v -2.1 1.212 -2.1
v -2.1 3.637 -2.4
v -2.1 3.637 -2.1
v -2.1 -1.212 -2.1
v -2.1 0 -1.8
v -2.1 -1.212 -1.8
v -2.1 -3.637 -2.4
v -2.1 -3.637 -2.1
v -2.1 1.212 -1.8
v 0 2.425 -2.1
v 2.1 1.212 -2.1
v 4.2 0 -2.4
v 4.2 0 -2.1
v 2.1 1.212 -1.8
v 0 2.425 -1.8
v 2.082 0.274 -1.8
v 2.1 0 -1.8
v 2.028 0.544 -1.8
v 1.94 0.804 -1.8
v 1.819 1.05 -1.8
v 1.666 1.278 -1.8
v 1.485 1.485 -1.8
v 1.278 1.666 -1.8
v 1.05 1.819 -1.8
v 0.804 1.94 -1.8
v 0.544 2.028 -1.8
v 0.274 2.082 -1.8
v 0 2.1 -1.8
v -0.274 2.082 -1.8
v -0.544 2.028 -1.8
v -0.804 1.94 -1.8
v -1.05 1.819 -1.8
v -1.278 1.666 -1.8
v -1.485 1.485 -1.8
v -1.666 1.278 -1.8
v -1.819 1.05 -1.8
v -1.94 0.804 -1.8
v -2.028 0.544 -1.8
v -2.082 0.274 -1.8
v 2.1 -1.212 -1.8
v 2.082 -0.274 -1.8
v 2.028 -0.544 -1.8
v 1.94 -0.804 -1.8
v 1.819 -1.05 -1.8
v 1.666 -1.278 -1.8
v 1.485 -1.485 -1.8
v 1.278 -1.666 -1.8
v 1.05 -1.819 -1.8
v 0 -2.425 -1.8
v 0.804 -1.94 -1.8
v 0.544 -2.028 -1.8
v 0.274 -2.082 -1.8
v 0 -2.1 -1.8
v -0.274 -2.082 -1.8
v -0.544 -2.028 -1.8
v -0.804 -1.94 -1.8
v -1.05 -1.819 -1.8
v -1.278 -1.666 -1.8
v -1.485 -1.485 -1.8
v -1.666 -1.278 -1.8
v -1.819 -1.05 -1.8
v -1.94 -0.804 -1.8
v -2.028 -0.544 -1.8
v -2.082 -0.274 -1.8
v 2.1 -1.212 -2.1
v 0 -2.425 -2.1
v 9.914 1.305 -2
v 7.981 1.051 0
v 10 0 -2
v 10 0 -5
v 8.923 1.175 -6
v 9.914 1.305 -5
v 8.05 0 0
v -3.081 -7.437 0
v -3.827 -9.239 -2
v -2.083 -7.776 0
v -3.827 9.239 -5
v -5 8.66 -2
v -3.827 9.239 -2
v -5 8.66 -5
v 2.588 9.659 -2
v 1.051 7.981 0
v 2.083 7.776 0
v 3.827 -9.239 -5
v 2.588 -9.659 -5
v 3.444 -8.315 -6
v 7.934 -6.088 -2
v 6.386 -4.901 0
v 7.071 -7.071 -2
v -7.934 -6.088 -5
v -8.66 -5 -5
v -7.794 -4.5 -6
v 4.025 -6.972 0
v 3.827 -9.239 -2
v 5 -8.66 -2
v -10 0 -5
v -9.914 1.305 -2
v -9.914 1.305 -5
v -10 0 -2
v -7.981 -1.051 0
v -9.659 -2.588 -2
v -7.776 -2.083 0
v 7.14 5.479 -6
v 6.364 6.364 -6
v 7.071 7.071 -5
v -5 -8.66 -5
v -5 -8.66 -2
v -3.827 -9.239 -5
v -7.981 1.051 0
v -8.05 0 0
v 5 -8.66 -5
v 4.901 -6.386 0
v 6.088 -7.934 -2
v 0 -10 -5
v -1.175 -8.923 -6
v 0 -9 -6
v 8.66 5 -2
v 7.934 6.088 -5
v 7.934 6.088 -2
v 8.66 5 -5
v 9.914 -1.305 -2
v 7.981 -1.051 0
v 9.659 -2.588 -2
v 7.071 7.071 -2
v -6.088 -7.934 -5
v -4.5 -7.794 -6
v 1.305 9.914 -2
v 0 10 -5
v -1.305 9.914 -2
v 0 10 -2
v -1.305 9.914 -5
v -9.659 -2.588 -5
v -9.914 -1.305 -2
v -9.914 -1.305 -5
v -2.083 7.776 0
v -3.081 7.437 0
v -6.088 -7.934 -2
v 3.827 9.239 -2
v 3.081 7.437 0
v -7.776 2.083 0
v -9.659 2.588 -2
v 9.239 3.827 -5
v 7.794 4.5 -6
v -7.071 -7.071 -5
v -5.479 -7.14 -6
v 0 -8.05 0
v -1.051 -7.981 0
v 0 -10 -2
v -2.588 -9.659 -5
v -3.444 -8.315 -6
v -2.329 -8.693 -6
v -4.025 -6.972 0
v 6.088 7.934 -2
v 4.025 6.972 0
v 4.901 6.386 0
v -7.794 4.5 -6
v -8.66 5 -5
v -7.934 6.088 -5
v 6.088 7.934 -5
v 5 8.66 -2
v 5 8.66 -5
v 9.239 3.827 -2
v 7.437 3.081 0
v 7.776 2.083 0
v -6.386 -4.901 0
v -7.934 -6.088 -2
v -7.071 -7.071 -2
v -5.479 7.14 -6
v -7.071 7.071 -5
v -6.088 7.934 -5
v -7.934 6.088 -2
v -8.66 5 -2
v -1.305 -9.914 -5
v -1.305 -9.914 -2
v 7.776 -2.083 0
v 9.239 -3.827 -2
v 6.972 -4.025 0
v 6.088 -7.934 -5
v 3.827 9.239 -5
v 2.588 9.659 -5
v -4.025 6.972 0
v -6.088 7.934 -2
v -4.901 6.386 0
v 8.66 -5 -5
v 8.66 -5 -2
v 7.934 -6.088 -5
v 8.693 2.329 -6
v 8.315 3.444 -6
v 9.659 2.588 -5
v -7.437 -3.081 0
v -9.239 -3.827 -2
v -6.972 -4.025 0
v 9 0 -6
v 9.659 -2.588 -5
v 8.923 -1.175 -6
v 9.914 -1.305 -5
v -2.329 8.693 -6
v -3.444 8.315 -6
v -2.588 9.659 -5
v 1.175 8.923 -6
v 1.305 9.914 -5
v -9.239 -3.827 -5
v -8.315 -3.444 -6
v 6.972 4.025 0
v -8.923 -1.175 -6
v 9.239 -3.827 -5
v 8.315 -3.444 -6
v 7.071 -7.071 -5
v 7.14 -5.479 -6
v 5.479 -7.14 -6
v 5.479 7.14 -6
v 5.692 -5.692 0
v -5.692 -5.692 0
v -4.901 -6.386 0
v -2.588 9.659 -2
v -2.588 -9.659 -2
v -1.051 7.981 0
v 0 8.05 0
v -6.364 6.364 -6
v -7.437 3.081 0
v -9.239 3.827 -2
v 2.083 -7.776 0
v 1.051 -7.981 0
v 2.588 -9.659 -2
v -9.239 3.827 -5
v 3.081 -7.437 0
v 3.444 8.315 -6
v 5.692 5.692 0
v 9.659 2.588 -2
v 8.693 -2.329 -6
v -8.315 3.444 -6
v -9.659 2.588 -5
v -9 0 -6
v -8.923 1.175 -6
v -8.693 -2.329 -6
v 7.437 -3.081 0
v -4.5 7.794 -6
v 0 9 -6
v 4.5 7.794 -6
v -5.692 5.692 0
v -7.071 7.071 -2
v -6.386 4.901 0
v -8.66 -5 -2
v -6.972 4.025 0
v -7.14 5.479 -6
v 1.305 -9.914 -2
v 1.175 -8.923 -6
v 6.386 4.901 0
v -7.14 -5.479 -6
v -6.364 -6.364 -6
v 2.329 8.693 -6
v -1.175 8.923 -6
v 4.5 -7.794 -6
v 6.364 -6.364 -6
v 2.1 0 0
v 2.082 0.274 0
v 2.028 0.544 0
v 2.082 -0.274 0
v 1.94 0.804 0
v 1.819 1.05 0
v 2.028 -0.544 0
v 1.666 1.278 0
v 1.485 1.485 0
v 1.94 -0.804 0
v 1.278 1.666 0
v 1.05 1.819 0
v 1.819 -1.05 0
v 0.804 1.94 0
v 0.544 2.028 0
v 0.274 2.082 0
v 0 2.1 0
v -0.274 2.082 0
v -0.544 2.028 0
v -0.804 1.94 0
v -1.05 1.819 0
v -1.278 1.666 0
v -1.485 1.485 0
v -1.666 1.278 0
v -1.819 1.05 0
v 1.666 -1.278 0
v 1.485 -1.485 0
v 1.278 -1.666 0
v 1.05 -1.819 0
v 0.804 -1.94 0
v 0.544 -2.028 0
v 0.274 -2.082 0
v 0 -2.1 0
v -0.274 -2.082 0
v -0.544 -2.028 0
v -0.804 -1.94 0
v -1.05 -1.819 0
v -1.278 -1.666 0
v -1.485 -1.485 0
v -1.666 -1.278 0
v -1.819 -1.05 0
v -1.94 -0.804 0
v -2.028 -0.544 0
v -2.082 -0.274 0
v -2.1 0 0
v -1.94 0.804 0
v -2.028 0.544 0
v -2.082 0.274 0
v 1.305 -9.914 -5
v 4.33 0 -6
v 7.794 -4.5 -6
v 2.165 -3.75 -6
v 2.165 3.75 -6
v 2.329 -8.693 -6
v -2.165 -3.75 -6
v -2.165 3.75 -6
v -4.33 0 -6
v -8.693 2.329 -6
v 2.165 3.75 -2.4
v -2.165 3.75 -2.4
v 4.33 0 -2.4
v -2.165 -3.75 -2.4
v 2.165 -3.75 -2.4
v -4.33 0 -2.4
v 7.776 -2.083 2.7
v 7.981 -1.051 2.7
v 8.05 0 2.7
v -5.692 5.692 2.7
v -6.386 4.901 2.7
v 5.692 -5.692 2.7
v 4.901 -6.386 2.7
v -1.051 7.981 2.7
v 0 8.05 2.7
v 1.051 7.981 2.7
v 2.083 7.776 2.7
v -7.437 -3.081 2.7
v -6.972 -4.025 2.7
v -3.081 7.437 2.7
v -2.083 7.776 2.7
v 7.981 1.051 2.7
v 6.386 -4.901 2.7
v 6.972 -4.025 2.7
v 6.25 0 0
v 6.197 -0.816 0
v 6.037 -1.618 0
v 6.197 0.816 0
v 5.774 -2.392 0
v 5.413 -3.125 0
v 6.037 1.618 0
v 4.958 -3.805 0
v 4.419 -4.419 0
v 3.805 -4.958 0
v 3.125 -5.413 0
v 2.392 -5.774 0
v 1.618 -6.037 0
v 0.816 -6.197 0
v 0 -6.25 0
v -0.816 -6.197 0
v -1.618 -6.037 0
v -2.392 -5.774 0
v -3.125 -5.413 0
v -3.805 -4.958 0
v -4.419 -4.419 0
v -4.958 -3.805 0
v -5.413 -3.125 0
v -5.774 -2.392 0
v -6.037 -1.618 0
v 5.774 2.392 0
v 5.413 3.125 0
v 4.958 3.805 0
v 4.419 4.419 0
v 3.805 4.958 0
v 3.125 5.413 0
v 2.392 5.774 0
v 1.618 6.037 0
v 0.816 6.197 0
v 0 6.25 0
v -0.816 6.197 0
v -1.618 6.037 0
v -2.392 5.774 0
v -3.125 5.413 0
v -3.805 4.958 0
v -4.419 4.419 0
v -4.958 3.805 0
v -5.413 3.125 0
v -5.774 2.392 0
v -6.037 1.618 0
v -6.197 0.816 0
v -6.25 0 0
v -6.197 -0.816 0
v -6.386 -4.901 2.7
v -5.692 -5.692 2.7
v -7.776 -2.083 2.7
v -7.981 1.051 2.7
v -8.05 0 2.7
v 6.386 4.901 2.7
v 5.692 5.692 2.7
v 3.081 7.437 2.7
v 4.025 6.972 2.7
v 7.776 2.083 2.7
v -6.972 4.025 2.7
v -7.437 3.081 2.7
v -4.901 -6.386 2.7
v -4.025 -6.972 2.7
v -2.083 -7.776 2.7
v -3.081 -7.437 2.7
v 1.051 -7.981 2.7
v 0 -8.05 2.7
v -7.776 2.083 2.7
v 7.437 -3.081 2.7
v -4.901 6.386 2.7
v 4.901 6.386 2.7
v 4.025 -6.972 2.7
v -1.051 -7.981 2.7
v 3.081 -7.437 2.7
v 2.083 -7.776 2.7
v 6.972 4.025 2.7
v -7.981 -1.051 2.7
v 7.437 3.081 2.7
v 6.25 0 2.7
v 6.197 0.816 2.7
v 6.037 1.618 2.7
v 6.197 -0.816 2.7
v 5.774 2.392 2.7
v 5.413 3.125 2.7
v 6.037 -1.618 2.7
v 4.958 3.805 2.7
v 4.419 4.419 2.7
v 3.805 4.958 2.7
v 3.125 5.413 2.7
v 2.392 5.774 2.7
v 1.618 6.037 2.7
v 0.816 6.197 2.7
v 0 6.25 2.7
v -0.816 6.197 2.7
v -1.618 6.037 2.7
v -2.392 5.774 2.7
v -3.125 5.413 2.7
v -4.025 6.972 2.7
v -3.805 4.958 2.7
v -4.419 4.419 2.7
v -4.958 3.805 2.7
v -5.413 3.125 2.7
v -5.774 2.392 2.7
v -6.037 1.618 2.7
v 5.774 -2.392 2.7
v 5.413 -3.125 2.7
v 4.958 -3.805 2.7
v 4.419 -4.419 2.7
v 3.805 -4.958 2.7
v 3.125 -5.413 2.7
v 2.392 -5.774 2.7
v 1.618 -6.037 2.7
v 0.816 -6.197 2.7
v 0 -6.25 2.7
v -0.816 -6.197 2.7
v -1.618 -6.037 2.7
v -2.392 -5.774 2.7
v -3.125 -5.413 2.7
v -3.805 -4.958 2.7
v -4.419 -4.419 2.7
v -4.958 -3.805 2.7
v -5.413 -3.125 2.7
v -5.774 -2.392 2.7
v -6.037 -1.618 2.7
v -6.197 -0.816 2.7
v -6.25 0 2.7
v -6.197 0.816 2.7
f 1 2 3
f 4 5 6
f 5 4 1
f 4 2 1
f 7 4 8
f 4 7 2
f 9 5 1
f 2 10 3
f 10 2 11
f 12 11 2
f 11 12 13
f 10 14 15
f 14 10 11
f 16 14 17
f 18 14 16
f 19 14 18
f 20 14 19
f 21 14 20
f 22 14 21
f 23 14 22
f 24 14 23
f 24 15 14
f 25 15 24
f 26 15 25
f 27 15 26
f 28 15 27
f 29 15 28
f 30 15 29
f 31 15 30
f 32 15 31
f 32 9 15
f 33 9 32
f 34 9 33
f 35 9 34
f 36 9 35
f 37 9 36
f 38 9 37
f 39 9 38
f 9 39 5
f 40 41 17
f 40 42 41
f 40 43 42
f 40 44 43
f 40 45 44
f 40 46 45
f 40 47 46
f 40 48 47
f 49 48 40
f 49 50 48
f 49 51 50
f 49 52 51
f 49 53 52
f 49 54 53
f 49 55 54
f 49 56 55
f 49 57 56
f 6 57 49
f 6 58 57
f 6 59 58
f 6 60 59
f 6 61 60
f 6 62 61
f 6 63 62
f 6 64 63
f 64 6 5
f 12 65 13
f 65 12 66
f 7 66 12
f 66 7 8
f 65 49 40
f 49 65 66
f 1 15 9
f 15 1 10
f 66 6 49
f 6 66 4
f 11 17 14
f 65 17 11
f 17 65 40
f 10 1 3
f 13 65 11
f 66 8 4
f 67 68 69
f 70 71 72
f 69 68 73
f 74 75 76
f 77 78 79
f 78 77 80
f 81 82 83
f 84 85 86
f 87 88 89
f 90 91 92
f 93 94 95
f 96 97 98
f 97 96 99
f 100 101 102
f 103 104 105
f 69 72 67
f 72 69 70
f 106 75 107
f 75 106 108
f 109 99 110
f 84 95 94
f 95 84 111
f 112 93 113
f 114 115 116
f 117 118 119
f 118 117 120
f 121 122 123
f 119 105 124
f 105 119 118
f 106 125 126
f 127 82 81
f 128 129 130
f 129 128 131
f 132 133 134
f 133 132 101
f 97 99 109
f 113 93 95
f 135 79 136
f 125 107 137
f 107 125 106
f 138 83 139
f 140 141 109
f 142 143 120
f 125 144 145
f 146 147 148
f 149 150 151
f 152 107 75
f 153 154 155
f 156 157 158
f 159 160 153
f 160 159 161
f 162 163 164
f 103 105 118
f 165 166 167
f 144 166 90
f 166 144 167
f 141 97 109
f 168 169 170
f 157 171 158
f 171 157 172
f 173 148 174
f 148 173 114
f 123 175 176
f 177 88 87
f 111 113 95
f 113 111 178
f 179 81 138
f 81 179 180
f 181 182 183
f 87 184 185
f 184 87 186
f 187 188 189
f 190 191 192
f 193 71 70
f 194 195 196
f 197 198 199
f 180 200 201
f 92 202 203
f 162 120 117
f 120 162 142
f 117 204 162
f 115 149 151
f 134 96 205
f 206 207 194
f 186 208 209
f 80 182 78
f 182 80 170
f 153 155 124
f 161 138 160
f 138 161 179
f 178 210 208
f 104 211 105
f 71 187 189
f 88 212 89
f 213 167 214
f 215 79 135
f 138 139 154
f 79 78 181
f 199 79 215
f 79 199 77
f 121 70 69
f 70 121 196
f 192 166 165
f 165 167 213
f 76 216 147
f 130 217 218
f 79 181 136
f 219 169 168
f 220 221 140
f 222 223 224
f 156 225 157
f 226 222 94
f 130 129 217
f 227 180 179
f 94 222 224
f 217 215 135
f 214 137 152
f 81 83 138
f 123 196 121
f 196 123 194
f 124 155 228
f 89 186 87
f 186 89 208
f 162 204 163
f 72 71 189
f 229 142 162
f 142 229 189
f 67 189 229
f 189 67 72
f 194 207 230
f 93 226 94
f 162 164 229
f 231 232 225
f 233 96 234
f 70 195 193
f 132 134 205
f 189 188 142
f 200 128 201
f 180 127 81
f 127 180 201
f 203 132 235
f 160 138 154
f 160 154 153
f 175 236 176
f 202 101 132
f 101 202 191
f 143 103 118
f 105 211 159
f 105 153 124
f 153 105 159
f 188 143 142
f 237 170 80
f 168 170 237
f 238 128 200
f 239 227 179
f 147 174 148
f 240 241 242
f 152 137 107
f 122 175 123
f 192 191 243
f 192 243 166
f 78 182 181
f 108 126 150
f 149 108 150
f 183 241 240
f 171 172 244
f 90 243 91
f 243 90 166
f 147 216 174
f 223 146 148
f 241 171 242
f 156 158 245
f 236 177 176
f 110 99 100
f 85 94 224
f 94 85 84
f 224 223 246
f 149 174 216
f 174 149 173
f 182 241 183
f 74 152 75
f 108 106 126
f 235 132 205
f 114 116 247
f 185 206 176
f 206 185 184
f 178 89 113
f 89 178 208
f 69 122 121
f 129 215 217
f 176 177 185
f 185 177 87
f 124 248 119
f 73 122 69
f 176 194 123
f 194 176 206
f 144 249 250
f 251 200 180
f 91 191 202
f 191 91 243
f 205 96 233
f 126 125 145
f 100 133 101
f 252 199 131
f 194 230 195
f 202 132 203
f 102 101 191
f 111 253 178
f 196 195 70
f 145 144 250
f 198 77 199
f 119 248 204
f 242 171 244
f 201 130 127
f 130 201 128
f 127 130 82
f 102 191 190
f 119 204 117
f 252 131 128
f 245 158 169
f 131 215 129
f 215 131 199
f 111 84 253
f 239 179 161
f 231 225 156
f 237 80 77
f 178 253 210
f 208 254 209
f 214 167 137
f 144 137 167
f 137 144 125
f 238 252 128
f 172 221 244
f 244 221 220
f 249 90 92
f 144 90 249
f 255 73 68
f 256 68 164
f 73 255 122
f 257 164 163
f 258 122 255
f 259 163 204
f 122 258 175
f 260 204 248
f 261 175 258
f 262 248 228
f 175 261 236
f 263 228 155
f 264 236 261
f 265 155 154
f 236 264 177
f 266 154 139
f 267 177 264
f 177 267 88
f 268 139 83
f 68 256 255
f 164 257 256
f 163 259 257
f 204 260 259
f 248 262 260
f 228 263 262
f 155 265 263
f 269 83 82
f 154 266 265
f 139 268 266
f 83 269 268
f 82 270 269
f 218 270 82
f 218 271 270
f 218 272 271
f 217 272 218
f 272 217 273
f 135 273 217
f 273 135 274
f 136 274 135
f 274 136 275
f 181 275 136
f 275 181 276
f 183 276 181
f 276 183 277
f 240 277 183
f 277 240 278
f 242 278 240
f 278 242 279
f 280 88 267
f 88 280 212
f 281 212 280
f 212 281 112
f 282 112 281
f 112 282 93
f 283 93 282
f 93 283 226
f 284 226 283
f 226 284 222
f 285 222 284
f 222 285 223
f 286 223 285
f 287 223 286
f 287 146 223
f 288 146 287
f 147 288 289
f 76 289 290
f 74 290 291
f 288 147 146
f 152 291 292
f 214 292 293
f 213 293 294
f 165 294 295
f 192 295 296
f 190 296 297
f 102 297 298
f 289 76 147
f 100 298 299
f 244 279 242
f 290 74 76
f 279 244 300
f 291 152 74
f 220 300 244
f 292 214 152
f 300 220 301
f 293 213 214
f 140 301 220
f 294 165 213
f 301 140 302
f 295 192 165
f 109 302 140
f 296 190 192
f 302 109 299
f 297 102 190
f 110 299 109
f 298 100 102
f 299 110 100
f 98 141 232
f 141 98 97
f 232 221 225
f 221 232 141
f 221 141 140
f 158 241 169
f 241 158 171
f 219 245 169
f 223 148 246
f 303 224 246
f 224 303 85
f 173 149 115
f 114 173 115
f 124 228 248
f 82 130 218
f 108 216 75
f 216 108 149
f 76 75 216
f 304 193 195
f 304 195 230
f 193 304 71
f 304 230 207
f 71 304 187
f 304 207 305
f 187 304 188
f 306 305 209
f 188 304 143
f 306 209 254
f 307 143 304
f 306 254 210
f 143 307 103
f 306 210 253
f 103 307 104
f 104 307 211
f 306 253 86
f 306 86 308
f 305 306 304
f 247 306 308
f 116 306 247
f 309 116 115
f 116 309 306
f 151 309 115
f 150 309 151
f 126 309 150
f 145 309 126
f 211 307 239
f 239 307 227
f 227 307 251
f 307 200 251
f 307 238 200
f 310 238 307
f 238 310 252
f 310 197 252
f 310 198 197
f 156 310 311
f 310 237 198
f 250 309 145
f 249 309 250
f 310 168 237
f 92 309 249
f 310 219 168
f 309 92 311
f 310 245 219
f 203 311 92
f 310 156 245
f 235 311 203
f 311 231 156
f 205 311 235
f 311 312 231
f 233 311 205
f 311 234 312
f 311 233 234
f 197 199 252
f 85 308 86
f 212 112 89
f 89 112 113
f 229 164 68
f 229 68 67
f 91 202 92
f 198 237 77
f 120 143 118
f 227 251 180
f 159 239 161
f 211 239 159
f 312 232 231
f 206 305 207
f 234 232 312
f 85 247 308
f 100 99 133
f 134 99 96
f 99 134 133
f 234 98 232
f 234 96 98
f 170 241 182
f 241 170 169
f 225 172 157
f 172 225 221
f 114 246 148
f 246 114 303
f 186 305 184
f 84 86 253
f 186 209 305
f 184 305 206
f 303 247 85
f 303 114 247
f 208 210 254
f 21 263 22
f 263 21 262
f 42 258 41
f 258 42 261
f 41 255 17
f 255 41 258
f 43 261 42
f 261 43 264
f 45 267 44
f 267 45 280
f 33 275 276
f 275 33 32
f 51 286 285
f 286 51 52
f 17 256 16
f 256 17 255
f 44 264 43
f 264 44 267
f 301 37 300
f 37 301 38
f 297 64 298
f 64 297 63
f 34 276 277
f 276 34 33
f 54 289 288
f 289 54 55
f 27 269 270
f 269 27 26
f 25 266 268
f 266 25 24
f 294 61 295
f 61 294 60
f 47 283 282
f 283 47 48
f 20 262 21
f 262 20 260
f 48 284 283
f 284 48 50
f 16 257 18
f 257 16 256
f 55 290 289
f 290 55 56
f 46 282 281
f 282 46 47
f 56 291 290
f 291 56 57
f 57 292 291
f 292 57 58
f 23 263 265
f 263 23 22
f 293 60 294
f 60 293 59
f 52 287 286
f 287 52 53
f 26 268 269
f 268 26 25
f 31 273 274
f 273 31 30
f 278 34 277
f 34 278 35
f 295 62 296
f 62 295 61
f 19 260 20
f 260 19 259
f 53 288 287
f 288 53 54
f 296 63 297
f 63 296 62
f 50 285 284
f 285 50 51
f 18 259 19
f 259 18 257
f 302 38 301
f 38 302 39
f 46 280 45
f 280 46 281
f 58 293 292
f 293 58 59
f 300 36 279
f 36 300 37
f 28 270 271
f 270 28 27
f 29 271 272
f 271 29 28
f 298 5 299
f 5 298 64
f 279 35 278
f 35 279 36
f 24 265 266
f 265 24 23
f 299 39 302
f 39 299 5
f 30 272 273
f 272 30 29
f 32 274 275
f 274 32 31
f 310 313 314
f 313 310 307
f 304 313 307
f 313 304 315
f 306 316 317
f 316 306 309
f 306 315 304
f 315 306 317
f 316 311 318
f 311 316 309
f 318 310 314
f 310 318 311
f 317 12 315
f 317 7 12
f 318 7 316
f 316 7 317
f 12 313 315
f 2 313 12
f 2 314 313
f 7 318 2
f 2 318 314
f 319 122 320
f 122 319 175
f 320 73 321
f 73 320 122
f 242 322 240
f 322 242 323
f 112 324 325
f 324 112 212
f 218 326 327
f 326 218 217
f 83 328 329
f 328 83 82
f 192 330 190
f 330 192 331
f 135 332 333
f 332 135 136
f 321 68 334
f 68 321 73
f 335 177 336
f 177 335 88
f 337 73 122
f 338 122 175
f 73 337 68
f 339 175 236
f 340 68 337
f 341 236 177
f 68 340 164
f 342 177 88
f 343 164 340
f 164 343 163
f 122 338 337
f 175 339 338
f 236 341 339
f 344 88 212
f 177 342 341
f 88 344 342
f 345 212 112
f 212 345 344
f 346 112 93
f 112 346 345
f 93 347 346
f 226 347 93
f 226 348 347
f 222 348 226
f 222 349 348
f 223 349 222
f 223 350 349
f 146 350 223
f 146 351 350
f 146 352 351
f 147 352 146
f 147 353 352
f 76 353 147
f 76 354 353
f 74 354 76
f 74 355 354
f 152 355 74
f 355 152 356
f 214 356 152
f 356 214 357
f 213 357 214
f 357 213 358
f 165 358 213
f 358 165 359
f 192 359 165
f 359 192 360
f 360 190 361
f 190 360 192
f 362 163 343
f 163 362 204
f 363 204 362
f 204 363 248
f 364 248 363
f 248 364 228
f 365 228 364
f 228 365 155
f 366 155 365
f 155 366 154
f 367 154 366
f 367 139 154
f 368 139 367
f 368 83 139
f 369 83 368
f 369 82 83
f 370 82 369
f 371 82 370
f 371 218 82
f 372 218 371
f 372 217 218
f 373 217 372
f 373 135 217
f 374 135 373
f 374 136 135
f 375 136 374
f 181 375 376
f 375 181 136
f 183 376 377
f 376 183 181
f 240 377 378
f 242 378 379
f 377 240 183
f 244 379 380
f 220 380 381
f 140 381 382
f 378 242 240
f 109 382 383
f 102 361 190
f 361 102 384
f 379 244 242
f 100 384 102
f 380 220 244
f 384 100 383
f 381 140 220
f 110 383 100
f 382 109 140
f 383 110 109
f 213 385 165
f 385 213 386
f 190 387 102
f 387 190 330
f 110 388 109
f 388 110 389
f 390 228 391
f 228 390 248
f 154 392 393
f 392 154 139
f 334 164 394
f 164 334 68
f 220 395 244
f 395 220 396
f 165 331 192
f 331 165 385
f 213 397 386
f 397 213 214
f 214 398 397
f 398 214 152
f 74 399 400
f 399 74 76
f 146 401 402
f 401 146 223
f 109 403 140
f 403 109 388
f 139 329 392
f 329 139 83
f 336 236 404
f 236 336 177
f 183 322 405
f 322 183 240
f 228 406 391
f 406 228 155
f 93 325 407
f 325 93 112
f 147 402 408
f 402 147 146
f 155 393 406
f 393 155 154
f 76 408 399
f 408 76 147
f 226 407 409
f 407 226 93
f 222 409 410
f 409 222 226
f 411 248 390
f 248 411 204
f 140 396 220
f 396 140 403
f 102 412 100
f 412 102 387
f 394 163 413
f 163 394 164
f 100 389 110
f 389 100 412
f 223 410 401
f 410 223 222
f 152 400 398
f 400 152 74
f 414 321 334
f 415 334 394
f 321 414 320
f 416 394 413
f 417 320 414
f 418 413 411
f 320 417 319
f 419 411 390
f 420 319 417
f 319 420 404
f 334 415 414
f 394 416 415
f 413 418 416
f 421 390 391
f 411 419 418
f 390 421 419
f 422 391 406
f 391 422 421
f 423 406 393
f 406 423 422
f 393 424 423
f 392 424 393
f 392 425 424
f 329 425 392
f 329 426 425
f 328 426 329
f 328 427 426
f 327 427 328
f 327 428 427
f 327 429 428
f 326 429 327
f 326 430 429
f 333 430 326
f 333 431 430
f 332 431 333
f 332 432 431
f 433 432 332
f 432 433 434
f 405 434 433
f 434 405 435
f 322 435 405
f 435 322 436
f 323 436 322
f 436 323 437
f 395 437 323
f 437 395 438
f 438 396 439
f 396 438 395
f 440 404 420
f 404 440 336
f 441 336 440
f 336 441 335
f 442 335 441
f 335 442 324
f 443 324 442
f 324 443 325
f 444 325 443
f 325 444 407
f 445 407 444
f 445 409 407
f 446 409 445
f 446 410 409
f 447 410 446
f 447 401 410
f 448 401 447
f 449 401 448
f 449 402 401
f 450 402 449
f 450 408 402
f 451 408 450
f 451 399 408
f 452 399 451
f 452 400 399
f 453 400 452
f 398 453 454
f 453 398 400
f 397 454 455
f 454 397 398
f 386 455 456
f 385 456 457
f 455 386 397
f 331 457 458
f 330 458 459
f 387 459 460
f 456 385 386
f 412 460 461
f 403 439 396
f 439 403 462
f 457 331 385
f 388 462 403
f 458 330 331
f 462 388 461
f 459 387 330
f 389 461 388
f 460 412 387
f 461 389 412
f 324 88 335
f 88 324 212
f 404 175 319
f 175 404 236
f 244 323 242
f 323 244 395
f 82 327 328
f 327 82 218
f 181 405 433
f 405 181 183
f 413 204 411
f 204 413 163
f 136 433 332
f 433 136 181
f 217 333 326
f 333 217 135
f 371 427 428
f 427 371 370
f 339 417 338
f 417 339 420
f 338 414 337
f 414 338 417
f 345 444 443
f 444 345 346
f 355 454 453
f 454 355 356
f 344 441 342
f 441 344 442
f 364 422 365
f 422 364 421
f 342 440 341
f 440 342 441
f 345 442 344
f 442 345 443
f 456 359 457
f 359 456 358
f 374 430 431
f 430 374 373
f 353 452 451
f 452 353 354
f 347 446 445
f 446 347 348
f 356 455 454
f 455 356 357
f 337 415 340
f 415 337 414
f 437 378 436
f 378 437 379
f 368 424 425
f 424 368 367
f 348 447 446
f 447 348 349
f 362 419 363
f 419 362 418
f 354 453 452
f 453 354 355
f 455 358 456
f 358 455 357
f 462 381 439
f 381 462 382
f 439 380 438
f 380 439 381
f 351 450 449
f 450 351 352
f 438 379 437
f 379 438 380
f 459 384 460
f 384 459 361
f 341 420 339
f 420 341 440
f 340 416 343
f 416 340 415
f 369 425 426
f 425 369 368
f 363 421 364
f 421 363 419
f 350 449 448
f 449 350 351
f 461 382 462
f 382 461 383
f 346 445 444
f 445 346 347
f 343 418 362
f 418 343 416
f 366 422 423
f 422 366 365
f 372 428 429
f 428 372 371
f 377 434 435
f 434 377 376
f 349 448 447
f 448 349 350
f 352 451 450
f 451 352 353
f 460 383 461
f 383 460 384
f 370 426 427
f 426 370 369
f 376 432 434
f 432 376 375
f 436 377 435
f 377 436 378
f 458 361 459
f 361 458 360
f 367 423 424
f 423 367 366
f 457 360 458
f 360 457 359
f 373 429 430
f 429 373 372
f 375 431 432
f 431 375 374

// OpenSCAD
// file: symmetry.scad
// duplicate and mirror
module mirror_dup(v) {
  children();
  mirror(v) children();
}

// duplicate and mirror in x
module mirror_dup_x () { mirror_dup([1,0,0]) children(); }
// duplicate and mirror in y
module mirror_dup_y () { mirror_dup([0,1,0]) children(); }
// duplicate and mirror in z
module mirror_dup_z () { mirror_dup([0,0,1]) children(); }

// translate in v and duplicate in +-d
module translate_s(v=[0,0,0],d=[0,0,0]) {
  translate(v) {
    translate(d) children();
    translate(-1*d) children();
  }
}

// translate and duplicate in +-x
module translate_xs(v=[0,0,0], dx=undef) {
  v = len(v)==2?[v.x,v.y,0]:v;
  if (is_undef(dx)) {
    translate(v) children();
    translate(v*[[-1,0,0],[0,1,0],[0,0,1]]) children();
  }
  else {
    translate(v) {
      translate([ dx,0,0]) children();
      translate([-dx,0,0]) children();
    }
  }
}

// translate and duplicate in +-y
module translate_ys(v=[0,0,0], dy=undef) {
  v = len(v)==2?[v.x,v.y,0]:v;
  if (is_undef(dy)) {
    translate(v) children();
    translate(v*[[1,0,0],[0,-1,0],[0,0,1]]) children();
  }
  else {
    translate(v) {
      translate([0, dy,0]) children();
      translate([0,-dy,0]) children();
    }
  }
}

// translate and duplicate in +-z
module translate_zs(v=[0,0,0], dz=undef) {
  if (is_undef(dz)) {
    translate(v) children();
    translate(v*[[1,0,0],[0,1,0],[0,0,-1]]) children();
  }
  else {
    translate(v) {
      translate([0,0, dz]) children();
      translate([0,0,-dz]) children();
    }
  }
}

// rotate +-a about v
module rotate_s(a,v=undef,orig=false) {
  if (orig == true) { children(); }
  if (is_list(a) || is_undef(v)) {
    rotate(a) children();
    rotate(-a) children();
  }
  else {
    rotate(a,v) children();
    rotate(-a,v) children();
  }
}

// rotate about vector starting at vs with direction v
module rotate_v(a, v=[0,0,1], vs=[0,0,0]) {
  translate(vs) rotate(a=a, v=v) translate(-1*vs) children();
}

// duplicate with rotational symmetry
module rsym(n) {
  for (a=[0:360/n:359]) rotate(a) children();
}

// rotate extrusion symmetric about x=0 plane
module rotate_extrude_s(angle=360,convexity=10) {
  rotate(-angle/2) rotate_extrude(angle=angle,convexity=convexity) children();
}
// file: metricparts.scad
include <threads.scad>

module nut_cut(fwidth, height, allowance=0) {
  cylinder($fn=6,r=(allowance+fwidth/2)/sin(60),h=height);
}

function get_hex_side(p) = lookup(p, [
 		[   1, 2.5 ],
 		[ 1.2, 3.0 ],
 		[ 1.4, 3.0 ],
 		[ 1.6, 3.2 ],
 		[   2, 4.0 ],
 		[ 2.5, 5.0 ],
 		[   3, 5.5 ],
 		[ 3.5, 6 ],
 		[   4, 7 ],
 		[   5, 8 ],
 		[   6, 10 ],
 		[   7, 11 ],
 		[   8, 13 ],
 		[  10, 17 ],
 	]);

function get_hex_major(p) = get_hex_side(p)/sin(60);

function get_hex_thick(p) = lookup(p, [
 		[   1, 0.8 ],
 		[ 1.2, 1 ],
 		[ 1.4, 1.2 ],
 		[ 1.6, 1.3 ],
 		[   2, 1.6 ],
 		[ 2.5, 2 ],
 		[   3, 2.4 ],
 		[ 3.5, 2.8 ],
 		[   4, 3.2 ],
 		[   5, 4 ],
 		[   6, 5 ],
 		[   7, 5.5 ],
 		[   8, 6.5 ],
 		[  10, 8 ],
 	]);

function get_pitch(p) = lookup(p, [
 		[   1, 0.25 ],
 		[ 1.2, 0.25 ],
 		[ 1.4, 0.3 ],
 		[ 1.6, 0.35 ],
 		[   2, 0.45 ],
 		[ 2.5, 0.45 ],
 		[   3, 0.6 ],
 		[ 3.5, 0.6 ],
 		[   4, 0.75 ],
 		[   5, 1 ],
 		[   6, 1 ],
 		[   7, 1 ],
 		[   8, 1.25 ],
 		[  10, 1.5 ],
 	]);

function get_washer_side(p) = lookup(p, [
 		[ 1.6, 4 ],
 		[   2, 5 ],
 		[ 2.5, 6 ],
 		[   3, 7 ],
 		[ 3.5, 8 ],
 		[   4, 9 ],
 		[   5, 10 ],
 		[   6, 12 ],
 		[   7, 14 ],
 		[   8, 16 ],
 		[  10, 20 ],
 	]);

function get_washer_hole(p) = lookup(p, [
 		[ 1.6, 1.7 ],
 		[   2, 2.2 ],
 		[ 2.5, 2.7 ],
 		[   3, 3.2 ],
 		[ 3.5, 3.7 ],
 		[   4, 4.3 ],
 		[   5, 5.3 ],
 		[   6, 6.4 ],
 		[   7, 7.4 ],
 		[   8, 8.4 ],
 		[  10, 10.5 ],
 	]);

function get_washer_thick(p) = lookup(p, [
 		[ 1.6, 0.3 ],
 		[   2, 0.3 ],
 		[ 2.5, 0.5 ],
 		[   3, 0.5 ],
 		[ 3.5, 0.5 ],
 		[   4, 0.8 ],
 		[   5, 1 ],
 		[   6, 1.6 ],
 		[   7, 1.6 ],
 		[   8, 1.6 ],
 		[  10, 2 ],
 	]);

function get_thread_depth(p) = get_pitch(p)*0.866;

module metric_washer(size) {
  difference() {
    cylinder(d=get_washer_side(size),h=get_washer_thick(size));
    translate([0,0,-0.1]) cylinder(d=get_washer_hole(size),h=get_washer_thick(size)+0.2);
  }
}

module shaftsupport_nut(
size, // nut size
allowance=0, // side allowance
sfactor=1.05, // shaft size factor
layer=0.2, // layer thickness
) {
  id = size*sfactor;
  od = (allowance+get_hex_side(size)/2)/sin(60);
  dd1=max(id/sin(30),od);
  translate([0,0,-0.01]) cylinder(d=dd1,h=layer+0.01,$fn=3);
  translate([0,0,layer-0.01]) intersection() {
    cylinder(d=dd1,h=layer+0.01,$fn=3);
    rotate(60) cylinder(d=id/sin(30),h=layer+0.01,$fn=3);
  }
}

module metric_nut_cut(
size, // nut size
depth=0, // override auto depth
add_depth=0, // additional depth over auto depth
allowance=0, // side allowance
) {
  nut_cut(get_hex_side(size),add_depth+((depth==0)?get_hex_thick(size):depth),allowance=allowance);
}

module metric_shaft_cut(
size, // bolt size
length, // cut depth
sfactor=1.05, // shaft oversize factor
shaft="free", // "free", "threaded", "undersized" or "undersized_hex"
allowance=0, // allowance for thread
test=$preview, // test mode
) {
  if (shaft == "threaded") {
    metric_thread(diameter=size+allowance,pitch=get_pitch(size),length=length,internal=true,test=test);
  }
  else if (shaft == "undersized") {
    cylinder(d=size-1.5*get_thread_depth(size), h=length);
  }
  else if (shaft == "undersized_hex") {
    cylinder(d=size, h=length, $fn=6);
  }
  else { //(shaft == "free") {
    cylinder(d=size*sfactor, h=length);
  }
}

module metric_countersunk_cut(
size, // bolt size
length, // cut depth
factor=1.1, // cone oversize factor
sfactor=1.05, // shaft oversize factor
shaft="free", // "free", "threaded", "undersized" or "undersized_hex"
allowance=0, // allowance for thread
test=$preview, // test mode
) {
  translate([0,0,-size*1.05]) union() {
    cylinder(d1=0,d2=size*2*(factor+0.05),h=size*(factor+0.05));
    translate([0,0,-length-size/2])
      metric_shaft_cut(size=size, length=length+size, sfactor=sfactor, shaft=shaft, allowance=allowance, test=test);
  }
}
// main file
use <metricparts.scad>
use <symmetry.scad>
$fn=48;
$tol=0.25;

outer=20;
inner=outer-2;
size=4;
wall=1.8;
shaft=12.5+wall*2;
lobes=6;
FullHeight=ceil(max(wall,get_hex_thick(size)+1)+wall);
ldia=outer/2.5;
KnobHeight=ceil(get_hex_thick(size)+1);


module CollLock() {
  difference() {
    union() {
      hull() {
        cylinder(d=shaft,h=1);
        translate([0,0,FullHeight-KnobHeight/2]) hull() {
          cylinder(d=outer,h=KnobHeight-2,center=true);
          cylinder(d=outer-2,h=KnobHeight,center=true);
        }
      }
    }
    translate([0,0,-shaft-1]) metric_shaft_cut(size,FullHeight+shaft+2);
    translate([0,0,wall+0.6]) metric_nut_cut(size,depth=FullHeight,allowance=$tol);
    translate([0,0,wall+0.6])rotate([180,0,0]) shaftsupport_nut(size,layer=0.3,allowance=$tol);
  }
  translate([0,0,-wall*1.5]) difference() {
    cylinder(d=shaft,h=wall*1.5);
    translate([0,0,-1]) cylinder(d=12.5,h=FullHeight);
  }
}

rotate([180,0,0]) CollLock();
